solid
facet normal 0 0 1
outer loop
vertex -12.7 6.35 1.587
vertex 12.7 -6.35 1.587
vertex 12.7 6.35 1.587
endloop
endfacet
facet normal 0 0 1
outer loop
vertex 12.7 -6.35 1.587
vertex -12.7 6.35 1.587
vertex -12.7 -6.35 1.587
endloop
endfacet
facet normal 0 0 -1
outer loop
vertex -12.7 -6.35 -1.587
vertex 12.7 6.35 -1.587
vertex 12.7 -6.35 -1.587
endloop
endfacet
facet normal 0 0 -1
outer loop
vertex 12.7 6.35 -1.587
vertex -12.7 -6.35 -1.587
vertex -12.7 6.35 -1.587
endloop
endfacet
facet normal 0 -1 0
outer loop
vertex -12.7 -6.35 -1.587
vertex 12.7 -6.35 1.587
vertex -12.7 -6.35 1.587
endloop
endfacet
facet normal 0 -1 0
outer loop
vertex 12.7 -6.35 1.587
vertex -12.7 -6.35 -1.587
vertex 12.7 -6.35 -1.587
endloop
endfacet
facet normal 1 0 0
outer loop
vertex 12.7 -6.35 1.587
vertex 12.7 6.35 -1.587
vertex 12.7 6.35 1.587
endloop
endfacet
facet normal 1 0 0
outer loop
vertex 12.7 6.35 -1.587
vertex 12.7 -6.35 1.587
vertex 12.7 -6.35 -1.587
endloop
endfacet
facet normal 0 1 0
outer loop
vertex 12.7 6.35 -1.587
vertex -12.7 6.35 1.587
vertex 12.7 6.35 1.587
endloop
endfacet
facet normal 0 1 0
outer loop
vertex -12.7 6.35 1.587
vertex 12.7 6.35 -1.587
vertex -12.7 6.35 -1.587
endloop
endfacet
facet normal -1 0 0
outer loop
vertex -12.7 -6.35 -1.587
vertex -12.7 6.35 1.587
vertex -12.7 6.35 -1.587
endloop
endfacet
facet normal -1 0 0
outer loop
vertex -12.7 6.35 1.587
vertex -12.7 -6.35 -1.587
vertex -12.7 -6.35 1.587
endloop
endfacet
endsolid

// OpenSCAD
// file: ../lib/DbgCtxStrLib1.scad
// DbgCtxStrLib1.0
// 
// Library for dealing with 'debug context strings' (usually 'dbgctxstr').

function dbgctxstr_errmsg_suffix(dbgctxstr) =
	is_undef(dbgctxstr) || dbgctxstr == "" ? "" :
	str(" (", dbgctxstr, ")");
// file: ../lib/TOGUnitTable-v1.scad
// TOGUnitTable-v1.1.0 - Library for handling 'complex amounts' in the form of [multiplier, unit name], e.g. [1.5, "inch"]
//
// 2023-07-01: the following 'annotation' is something I just made up,
// but is intended as a way for future packaging tools to know that it's 'safe'
// (because everything has been somewhat namespaced) to turn a `use <x>`
// into an `include <x>`, making it inlinable:
// safe-to-include: true
// 
// Versions:
// v1.0.0:
// - Created it.
// v1.1.0:
// - Add optional 'dbgctxstr' parameter to unit decoding functions, for better error messages
// 
// Naming convention:
// Doing 'OO without classes', here.
// Fully qualified name = class or package name + "__" + member name
// Class or package name may itself be namespaced, and class names may double as package names.
// Here, tog_unittable names both a class and a package.

// Demo unit table uses 'micrometer' as the base unit
// in order to keep multipliers as integers as much as possible.
tog_unittable__demo_unit_table = [
	["um",    [    1   ,   "um"], "micrometer" ],
	["mm",    [ 1000   ,   "um"], "millimeter" ],
	["inch",  [25400   ,   "um"], "inch"       ],
	["u",     [    1/16, "inch"], "model unit" ], // As used by TGx9 et al
	["atom",  [    8   ,    "u"], "model atom" ],
	["chunk", [    3   , "atom"], "model chunk"],
];

use <./DbgCtxStrLib1.scad>

function tog_unittable__list__filter(list, predicate) = [
	for( item=list ) if( predicate(item) ) item
];
function tog_unittable__list__first(list, on_error) =
	len(list) > 0 ? list[0] : on_error();

function tog_unittable__unit_value_ca(unit_table, unit_name, dbgctxstr=undef) =
	tog_unittable__list__first(
		tog_unittable__list__filter(unit_table, function (entry) entry[0] == unit_name),
		function () assert(false,
			str("Did not find entry for unit '", unit_name, "' in unit table", dbgctxstr_errmsg_suffix(dbgctxstr))
		)
	)[1];

function tog_unittable__ca__is_valid( ca ) =
	is_list(ca) && len(ca) == 2;

// Break down 'amount' until it is in a base unit (one which is defined in terms of itself)
function tog_unittable__simplify_ca(unit_table, amount, dbgctxstr=undef) =
	assert( tog_unittable__ca__is_valid(amount), str(amount, " is not a valid Complex Amount (should be [numeric_value, \"unit_name\"])", dbgctxstr=dbgctxstr) )
	let( unit_value_ca = tog_unittable__unit_value_ca(unit_table, amount[1], dbgctxstr=dbgctxstr) )
	unit_value_ca[1] == amount[1] ? amount :
		tog_unittable__simplify_ca(unit_table, [amount[0] * unit_value_ca[0], unit_value_ca[1]]);

function tog_unittable__divide_ca(unit_table, numerator, denominator, dbgctxstr=undef) =
	let(
		numerator_base_ca   = tog_unittable__simplify_ca(unit_table, numerator, dbgctxstr=dbgctxstr),
		denominator_base_ca = tog_unittable__simplify_ca(unit_table, denominator, dbgctxstr=dbgctxstr)
	)
	assert(numerator_base_ca[1] == denominator_base_ca[1], str("Different base units found for ", numerator[1], " and ", denominator[1]))
	numerator_base_ca[0] / denominator_base_ca[0];	

assert(tog_unittable__divide_ca(tog_unittable__demo_unit_table, [1,   "mm"], [  1, "mm"]) ==     1   );
assert(tog_unittable__divide_ca(tog_unittable__demo_unit_table, [1,   "mm"], [  1, "um"]) ==  1000   );
assert(tog_unittable__divide_ca(tog_unittable__demo_unit_table, [1, "inch"], [  1, "um"]) == 25400   );
assert(tog_unittable__divide_ca(tog_unittable__demo_unit_table, [1, "inch"], [  1, "mm"]) ==    25.4 );
assert(tog_unittable__divide_ca(tog_unittable__demo_unit_table, [1, "inch"], [254, "um"]) ==   100   );
assert(tog_unittable__divide_ca(tog_unittable__demo_unit_table, [1,    "u"], [  1, "um"]) ==  1587.5 );
// file: ../lib/TOGStringLib1.scad
// TOGStringLib1.7
// 
// Functions for parsing quantities
// and other misc. string handling.
// 
// v1.5
// - togstr1_parse_quantity will treat unit-only strings as meaning 1/1 of that unit.
//   e.g. togstr1_parse_quantity("foot") = [[[1,1], "foot", 4]]
// v1.6:
// - togstr1_parse_quantity allows unit name to be omitted when quantity is zero and $togunits1_default_unit is defined
// v1.7:
// - Add optional 'dbgctxstr' parameter to unit decoding functions, for better error messages
// 
// Globals: $togunits1_default_unit - affects what 'unit' is returned
// when interpreting numbers or strings that lack the unit.


function togstr1__todo(message) = assert(false, str("TODO: ", message));

module togstr1__assert_eq(a, b) {
	if( a != b ) {
		assert( a == b, str(a, " != ", b) );
	}
}



function togstr1_slice(source, i0, i1) =
	i0 == i1 ? "" :
	str(source[i0], togstr1_slice(source, i0+1, i1));

function togstr1_tokenize(source, sep, maxcount=9999, i=0, tokenstart=0) =
	len(source) == i ? (
		(tokenstart < i) ? [togstr1_slice(source, tokenstart, i)] : []
	) :
	source[i] == sep ? (
		(tokenstart < i) ? concat([togstr1_slice(source, tokenstart, i)], togstr1_tokenize(source, sep, maxcount-1, i+1, i+1)) :
		togstr1_tokenize(source, sep, maxcount, i+1, i+1)
	) :
	maxcount <= 1 ? [togstr1_slice(source, tokenstart, len(source))] :
	togstr1_tokenize(source, sep, maxcount, i+1, tokenstart);

togstr1__assert_eq( ["foo","bar","baz"], togstr1_tokenize("foo-bar-baz", "-") );
// Duplicate delimiters are ignored
togstr1__assert_eq( ["foo","bar","baz"], togstr1_tokenize("foo--bar--baz", "-") );
// Trailing delimiters are ignored
togstr1__assert_eq( ["foo","bar","baz"], togstr1_tokenize("foo--bar--baz--", "-") );
// Leading delimiters are ignored
togstr1__assert_eq( ["foo","bar","baz"], togstr1_tokenize("--foo--bar--baz", "-") );
// Can limit number of tokens returned
togstr1__assert_eq( ["foo","bar-baz"], togstr1_tokenize("foo-bar-baz", "-", 2) );
togstr1__assert_eq( ["foo","bar-baz"], togstr1_tokenize("--foo--bar-baz", "-", 2) );
togstr1__assert_eq( ["foo","bar--baz"], togstr1_tokenize("--foo--bar--baz", "-", 2) );
togstr1__assert_eq( ["foo"], togstr1_tokenize("--foo--", "-", 2) );




/** \d+ -> [num, end_index] */
function togstr1_parse_decimal_nat(str, index=0, current=0, dbgctxstr=undef) =
	len(str) == index ? [current, index] :
	let( dig = ord(str[index]) - ord("0") )
	(dig >= 0 && dig <= 9) ? togstr1_parse_decimal_nat(str, index+1, current*10 + dig, dbgctxstr=dbgctxstr) :
	[current, index];

togstr1__assert_eq( [123,3], togstr1_parse_decimal_nat("123") );
togstr1__assert_eq( [123,3], togstr1_parse_decimal_nat("123.45") );

/** [+-]*\d+ ->  [[num, den], end_index] */
function togstr1_parse_decimal_number(str, index=0, dbgctxstr=undef) =
	str[index] == "+" ? togstr1_parse_decimal_number(str, index+1) :
	str[index] == "-" ? let(r=togstr1_parse_decimal_number(str, index+1)) [[-r[0][0], r[0][1]], r[1]] :
	let(r = togstr1_parse_decimal_nat(str, index, dbgctxstr=dbgctxstr))
	str[r[1]] != "." ? [[r[0], 1], r[1]] :
	let(fracr = togstr1_parse_decimal_nat(str, r[1]+1))
	let(mult = pow(10, fracr[1]-(r[1]+1)))
	[[r[0]*mult + fracr[0], mult], fracr[1]];

togstr1__assert_eq( [[   36,   1], 2], togstr1_parse_decimal_number( "36"   ) );
togstr1__assert_eq( [[ 3524, 100], 5], togstr1_parse_decimal_number( "35.24") );
togstr1__assert_eq( [[-3524, 100], 6], togstr1_parse_decimal_number("-35.24") );
togstr1__assert_eq( [[    0,   1], 0], togstr1_parse_decimal_number( "NotANumber") );

function togstr1__gcd(a, b) = b == 0 ? abs(a) : togstr1__gcd(b, a % b);

togstr1__assert_eq(10, togstr1__gcd(10, 20));
togstr1__assert_eq( 5, togstr1__gcd(10, 15));
togstr1__assert_eq( 2, togstr1__gcd(10, 14));


function togstr1__normalize_rat(rat) =
	let(gcd = togstr1__gcd(rat[0], rat[1]))
	// TODO: find LCD, divide top and bottom by it
	rat[0] < 0 && rat[1] < 0 ? [-rat[0]/gcd, -rat[1]/gcd] :
	[rat[0]/gcd, rat[1]/gcd];

/** <decnum>[/<decnum>] -> [[num, den], end_index] */
function togstr1__multiply_rat(a, b) =
	togstr1__normalize_rat(
		a[1] == b[1] ? [a[0]*b[0]/a[1], a[1]] : // TODO: LCD instead of special case
		[a[0]*b[0], a[1]*b[1]]
	);
function togstr1__divide_rat(a, b) = togstr1__normalize_rat([a[0]*b[1], a[1]*b[0]]);


function togstr1__add_rat(a, b) =
	togstr1__normalize_rat([a[0]*b[1] + b[0]*a[1], a[1]*b[1]]);
	
togstr1__assert_eq([1, 2], togstr1__add_rat([1, 3], [1, 6]));


/** Return [[num, den], end_index] */
function togstr1_parse_rational_number(str, index=0, dbgctxstr=undef) =
	let( numr = togstr1_parse_decimal_number(str, index, dbgctxstr=dbgctxstr) )
	str[numr[1]] == "+" ?
		let(numrb = togstr1_parse_rational_number(str, numr[1]+1, dbgctxstr=dbgctxstr))
		[togstr1__add_rat(numr[0], numrb[0]), numrb[1]]	:
	str[numr[1]] == "/" ?
		let( denr = togstr1_parse_decimal_number(str, numr[1]+1, dbgctxstr=dbgctxstr) )
		[togstr1__divide_rat(numr[0], denr[0]), denr[1]] :
	numr;

togstr1__assert_eq( [[   123,  1],3], togstr1_parse_rational_number( "123") );
togstr1__assert_eq( [[   123,  1],4], togstr1_parse_rational_number("+123") );
togstr1__assert_eq( [[-  123,  1],4], togstr1_parse_rational_number("-123") );
togstr1__assert_eq( [[   123,  1],6], togstr1_parse_rational_number("-+-123") );
togstr1__assert_eq( [[ 12345,100],6], togstr1_parse_rational_number("123.45") );
togstr1__assert_eq( [[  2469, 40],8], togstr1_parse_rational_number("123.45/2") );
togstr1__assert_eq( [[-  823,160],10], togstr1_parse_rational_number("-123.45/24") );
togstr1__assert_eq( [[     4,  3],5], togstr1_parse_rational_number( "1+1/3") );
togstr1__assert_eq( [[     0,  1],0], togstr1_parse_rational_number( "NotANumber!!") );


/** Return [[[num, den], unit], end_index] */
function togstr1_parse_quantity(str, dbgctxstr=undef) =
	let( numr = togstr1_parse_rational_number(str, dbgctxstr=dbgctxstr) )
	// For now, just let the unit be the rest of the string;
	// can revisit to stop at delimiters if needed in the future.
	numr[1] > 0 && numr[1] == len(str) && numr[0][0] == 0 && !is_undef($togunits1_default_unit) ? [[[0,1], $togunits1_default_unit], numr[1]] :
	assert( numr[1] < len(str), str("Quantity string missing unit: '", str, "'; note that '0' is acceptable if $togunits1_default_unit is defined"))
	let( unit = togstr1_slice(str, numr[1], len(str)) )
	let( quant = numr[1] > 0 ? numr[0] : [1,1] ) // No number = 1 (possibly this should be an error instead)
	[[quant, unit], len(str)];

togstr1__assert_eq( [[[  3,  1], "acre"],  5], togstr1_parse_quantity("3acre") );
togstr1__assert_eq( [[[  3,  5], "acre"],  7], togstr1_parse_quantity("3/5acre") );
togstr1__assert_eq( [[[301,500], "acre"], 10], togstr1_parse_quantity("3.01/5acre") );
togstr1__assert_eq( [[[  1,  1], "acre"],  4], togstr1_parse_quantity("acre") ); // Should either treat as one or throw an error!
togstr1__assert_eq( [[[  0,  1],"hectare"],1], togstr1_parse_quantity("0", $togunits1_default_unit="hectare") ); // Zero is fine if $togunits1_default_unit is defined
// file: ../lib/TOGridLib3.scad
// TOGridPileLib-v3.4
// 
// HOKAY WHAT ARE THE COMMON
// things that I want the library to do?
// 
// - [X] Be `include`-able, to make inlining easy
// - [X] Allow unit table to be overridden easily, but default by default
// - [ ] Support common configurations by name (e.g. "V9", or some "WSTYPE-...")
//   without having to pass 50 different parameters in
// - [ ] Support subtractions for those common configurations also,
//   such that you don't need to remember to 'do less rounding', etc.
// - [ ] Make a simple foot-only block that I can subtract stuff from
//   params: foot style
// - [ ] Make a block with a lip
// - [ ] Make a block foot, and I'll intersect it with some other things
// - [X] Translate a block_size_ca to mm
// 
// Changes:
// v3.1:
// - s/togridpile3_decode_size/togridpile3_decode_vector/
// v3.2:
// - togridpile3_decode(num) = num
// v3.3:
// - Change prefix from `togridpile3` to `togridlib3`
// v3.4:
// - Add optional 'dbgctxstr' parameter to unit decoding functions, for better error messages

use <../lib/TOGUnitTable-v1.scad>

function togridlib3_map(arr, fn) = [ for(item=arr) fn(item) ];

togridlib3_default_unit_table = [
	["um",    [    1,               "um"]],
	["mm",    [ 1000,               "um"]],
	["inch",  [25400,               "um"]],
	["u",     [    1.5875,          "mm"]],
	["atom",  [    8,                "u"]],
	["chunk", [    3,             "atom"]],
	["tgp-standard-bevel"   , [2,    "u"]], // Usuually 1/8"
	["m-outer-corner-radius", [4,    "u"]],
	["f-outer-corner-radius", [3,    "u"]],
];

function togridlib3_get_default_unit_table() = togridlib3_default_unit_table;
function togridlib3_get_unit_table() = is_undef($togridlib3_unit_table) ? togridlib3_default_unit_table : $togridlib3_unit_table;

function togridlib3_decode(dim, unit=[1, "mm"], unit_table=togridlib3_get_unit_table(), dbgctxstr=undef) =
	is_num(dim) ? dim : tog_unittable__divide_ca(unit_table, dim, unit, dbgctxstr=dbgctxstr);
function togridlib3_decode_vector(size, unit=[1, "mm"], unit_table=togridlib3_get_unit_table(), dbgctxstr=undef) =
	togridlib3_map(size, function(dim) is_num(dim) ? dim : tog_unittable__divide_ca(unit_table, dim, unit, dbgctxstr=dbgctxstr));

module togridlib3_cube(size, offset=0) {
	cube(togridlib3_decode_vector(size), center=true);
}
// file: ../lib/TOGUnits1.scad
// TOGUnits1.0
// 
// For simlifying quantity parsing and unit conversion

use <./TOGridLib3.scad>
use <./TOGStringLib1.scad>


function togunits1__is_ca(what) =
	is_list(what) && len(what) == 2 && is_num(what[0]) && is_string(what[1]);

function togunits1__parse_to_ca(what) =
	assert( is_string(what) )
	let( parseresult = togstr1_parse_quantity(what) )
	assert( parseresult[1] > 0, str("Failed to parse quantity from  ", what) )
	let( parsed = parseresult[0] )
	let( rat = parsed[0] )
	let( unit = parsed[1] )
	[rat[0]/rat[1], unit];

function togunits1_to_ca(what) =
	is_string(what) ? togunits1__parse_to_ca(what) :
	togunits1__is_ca(what) ? what :
	is_num(what) ? [what, "mm"] :
	assert(false, str("Unrecognized quantity representation: ", what));

function togunits1_to_mm(what) =
	let( ca = togunits1_to_ca(what) )
	togridlib3_decode(ca, unit=[1,"mm"]);
// main file
use <../lib/TOGUnits1.scad>

function togunits1__todo(message) = assert(false, str("TODO: ", message));

module togunits1__assert_eq(a, b, scale=undef) {
	as = is_undef(scale) ? a : round(a*scale);
	bs = is_undef(scale) ? b : round(b*scale);
	if( as != bs ) {
		assert( a == b, str(a, " != ", b) );
	}
}


togunits1__assert_eq(10  , togunits1_to_mm(10));
togunits1__assert_eq(10  , togunits1_to_mm("10mm"));
togunits1__assert_eq(25.4, togunits1_to_mm("1inch"));
togunits1__assert_eq(38.1, togunits1_to_mm("1+1/2inch"));
togunits1__assert_eq(38.1, togunits1_to_mm([1.5, "inch"]), 100);
togunits1__assert_eq(38.1, togunits1_to_mm([3  , "atom"]), 100);

cube([togunits1_to_mm("1inch"),togunits1_to_mm("1atom"),togunits1_to_mm("2u")], center=true);
